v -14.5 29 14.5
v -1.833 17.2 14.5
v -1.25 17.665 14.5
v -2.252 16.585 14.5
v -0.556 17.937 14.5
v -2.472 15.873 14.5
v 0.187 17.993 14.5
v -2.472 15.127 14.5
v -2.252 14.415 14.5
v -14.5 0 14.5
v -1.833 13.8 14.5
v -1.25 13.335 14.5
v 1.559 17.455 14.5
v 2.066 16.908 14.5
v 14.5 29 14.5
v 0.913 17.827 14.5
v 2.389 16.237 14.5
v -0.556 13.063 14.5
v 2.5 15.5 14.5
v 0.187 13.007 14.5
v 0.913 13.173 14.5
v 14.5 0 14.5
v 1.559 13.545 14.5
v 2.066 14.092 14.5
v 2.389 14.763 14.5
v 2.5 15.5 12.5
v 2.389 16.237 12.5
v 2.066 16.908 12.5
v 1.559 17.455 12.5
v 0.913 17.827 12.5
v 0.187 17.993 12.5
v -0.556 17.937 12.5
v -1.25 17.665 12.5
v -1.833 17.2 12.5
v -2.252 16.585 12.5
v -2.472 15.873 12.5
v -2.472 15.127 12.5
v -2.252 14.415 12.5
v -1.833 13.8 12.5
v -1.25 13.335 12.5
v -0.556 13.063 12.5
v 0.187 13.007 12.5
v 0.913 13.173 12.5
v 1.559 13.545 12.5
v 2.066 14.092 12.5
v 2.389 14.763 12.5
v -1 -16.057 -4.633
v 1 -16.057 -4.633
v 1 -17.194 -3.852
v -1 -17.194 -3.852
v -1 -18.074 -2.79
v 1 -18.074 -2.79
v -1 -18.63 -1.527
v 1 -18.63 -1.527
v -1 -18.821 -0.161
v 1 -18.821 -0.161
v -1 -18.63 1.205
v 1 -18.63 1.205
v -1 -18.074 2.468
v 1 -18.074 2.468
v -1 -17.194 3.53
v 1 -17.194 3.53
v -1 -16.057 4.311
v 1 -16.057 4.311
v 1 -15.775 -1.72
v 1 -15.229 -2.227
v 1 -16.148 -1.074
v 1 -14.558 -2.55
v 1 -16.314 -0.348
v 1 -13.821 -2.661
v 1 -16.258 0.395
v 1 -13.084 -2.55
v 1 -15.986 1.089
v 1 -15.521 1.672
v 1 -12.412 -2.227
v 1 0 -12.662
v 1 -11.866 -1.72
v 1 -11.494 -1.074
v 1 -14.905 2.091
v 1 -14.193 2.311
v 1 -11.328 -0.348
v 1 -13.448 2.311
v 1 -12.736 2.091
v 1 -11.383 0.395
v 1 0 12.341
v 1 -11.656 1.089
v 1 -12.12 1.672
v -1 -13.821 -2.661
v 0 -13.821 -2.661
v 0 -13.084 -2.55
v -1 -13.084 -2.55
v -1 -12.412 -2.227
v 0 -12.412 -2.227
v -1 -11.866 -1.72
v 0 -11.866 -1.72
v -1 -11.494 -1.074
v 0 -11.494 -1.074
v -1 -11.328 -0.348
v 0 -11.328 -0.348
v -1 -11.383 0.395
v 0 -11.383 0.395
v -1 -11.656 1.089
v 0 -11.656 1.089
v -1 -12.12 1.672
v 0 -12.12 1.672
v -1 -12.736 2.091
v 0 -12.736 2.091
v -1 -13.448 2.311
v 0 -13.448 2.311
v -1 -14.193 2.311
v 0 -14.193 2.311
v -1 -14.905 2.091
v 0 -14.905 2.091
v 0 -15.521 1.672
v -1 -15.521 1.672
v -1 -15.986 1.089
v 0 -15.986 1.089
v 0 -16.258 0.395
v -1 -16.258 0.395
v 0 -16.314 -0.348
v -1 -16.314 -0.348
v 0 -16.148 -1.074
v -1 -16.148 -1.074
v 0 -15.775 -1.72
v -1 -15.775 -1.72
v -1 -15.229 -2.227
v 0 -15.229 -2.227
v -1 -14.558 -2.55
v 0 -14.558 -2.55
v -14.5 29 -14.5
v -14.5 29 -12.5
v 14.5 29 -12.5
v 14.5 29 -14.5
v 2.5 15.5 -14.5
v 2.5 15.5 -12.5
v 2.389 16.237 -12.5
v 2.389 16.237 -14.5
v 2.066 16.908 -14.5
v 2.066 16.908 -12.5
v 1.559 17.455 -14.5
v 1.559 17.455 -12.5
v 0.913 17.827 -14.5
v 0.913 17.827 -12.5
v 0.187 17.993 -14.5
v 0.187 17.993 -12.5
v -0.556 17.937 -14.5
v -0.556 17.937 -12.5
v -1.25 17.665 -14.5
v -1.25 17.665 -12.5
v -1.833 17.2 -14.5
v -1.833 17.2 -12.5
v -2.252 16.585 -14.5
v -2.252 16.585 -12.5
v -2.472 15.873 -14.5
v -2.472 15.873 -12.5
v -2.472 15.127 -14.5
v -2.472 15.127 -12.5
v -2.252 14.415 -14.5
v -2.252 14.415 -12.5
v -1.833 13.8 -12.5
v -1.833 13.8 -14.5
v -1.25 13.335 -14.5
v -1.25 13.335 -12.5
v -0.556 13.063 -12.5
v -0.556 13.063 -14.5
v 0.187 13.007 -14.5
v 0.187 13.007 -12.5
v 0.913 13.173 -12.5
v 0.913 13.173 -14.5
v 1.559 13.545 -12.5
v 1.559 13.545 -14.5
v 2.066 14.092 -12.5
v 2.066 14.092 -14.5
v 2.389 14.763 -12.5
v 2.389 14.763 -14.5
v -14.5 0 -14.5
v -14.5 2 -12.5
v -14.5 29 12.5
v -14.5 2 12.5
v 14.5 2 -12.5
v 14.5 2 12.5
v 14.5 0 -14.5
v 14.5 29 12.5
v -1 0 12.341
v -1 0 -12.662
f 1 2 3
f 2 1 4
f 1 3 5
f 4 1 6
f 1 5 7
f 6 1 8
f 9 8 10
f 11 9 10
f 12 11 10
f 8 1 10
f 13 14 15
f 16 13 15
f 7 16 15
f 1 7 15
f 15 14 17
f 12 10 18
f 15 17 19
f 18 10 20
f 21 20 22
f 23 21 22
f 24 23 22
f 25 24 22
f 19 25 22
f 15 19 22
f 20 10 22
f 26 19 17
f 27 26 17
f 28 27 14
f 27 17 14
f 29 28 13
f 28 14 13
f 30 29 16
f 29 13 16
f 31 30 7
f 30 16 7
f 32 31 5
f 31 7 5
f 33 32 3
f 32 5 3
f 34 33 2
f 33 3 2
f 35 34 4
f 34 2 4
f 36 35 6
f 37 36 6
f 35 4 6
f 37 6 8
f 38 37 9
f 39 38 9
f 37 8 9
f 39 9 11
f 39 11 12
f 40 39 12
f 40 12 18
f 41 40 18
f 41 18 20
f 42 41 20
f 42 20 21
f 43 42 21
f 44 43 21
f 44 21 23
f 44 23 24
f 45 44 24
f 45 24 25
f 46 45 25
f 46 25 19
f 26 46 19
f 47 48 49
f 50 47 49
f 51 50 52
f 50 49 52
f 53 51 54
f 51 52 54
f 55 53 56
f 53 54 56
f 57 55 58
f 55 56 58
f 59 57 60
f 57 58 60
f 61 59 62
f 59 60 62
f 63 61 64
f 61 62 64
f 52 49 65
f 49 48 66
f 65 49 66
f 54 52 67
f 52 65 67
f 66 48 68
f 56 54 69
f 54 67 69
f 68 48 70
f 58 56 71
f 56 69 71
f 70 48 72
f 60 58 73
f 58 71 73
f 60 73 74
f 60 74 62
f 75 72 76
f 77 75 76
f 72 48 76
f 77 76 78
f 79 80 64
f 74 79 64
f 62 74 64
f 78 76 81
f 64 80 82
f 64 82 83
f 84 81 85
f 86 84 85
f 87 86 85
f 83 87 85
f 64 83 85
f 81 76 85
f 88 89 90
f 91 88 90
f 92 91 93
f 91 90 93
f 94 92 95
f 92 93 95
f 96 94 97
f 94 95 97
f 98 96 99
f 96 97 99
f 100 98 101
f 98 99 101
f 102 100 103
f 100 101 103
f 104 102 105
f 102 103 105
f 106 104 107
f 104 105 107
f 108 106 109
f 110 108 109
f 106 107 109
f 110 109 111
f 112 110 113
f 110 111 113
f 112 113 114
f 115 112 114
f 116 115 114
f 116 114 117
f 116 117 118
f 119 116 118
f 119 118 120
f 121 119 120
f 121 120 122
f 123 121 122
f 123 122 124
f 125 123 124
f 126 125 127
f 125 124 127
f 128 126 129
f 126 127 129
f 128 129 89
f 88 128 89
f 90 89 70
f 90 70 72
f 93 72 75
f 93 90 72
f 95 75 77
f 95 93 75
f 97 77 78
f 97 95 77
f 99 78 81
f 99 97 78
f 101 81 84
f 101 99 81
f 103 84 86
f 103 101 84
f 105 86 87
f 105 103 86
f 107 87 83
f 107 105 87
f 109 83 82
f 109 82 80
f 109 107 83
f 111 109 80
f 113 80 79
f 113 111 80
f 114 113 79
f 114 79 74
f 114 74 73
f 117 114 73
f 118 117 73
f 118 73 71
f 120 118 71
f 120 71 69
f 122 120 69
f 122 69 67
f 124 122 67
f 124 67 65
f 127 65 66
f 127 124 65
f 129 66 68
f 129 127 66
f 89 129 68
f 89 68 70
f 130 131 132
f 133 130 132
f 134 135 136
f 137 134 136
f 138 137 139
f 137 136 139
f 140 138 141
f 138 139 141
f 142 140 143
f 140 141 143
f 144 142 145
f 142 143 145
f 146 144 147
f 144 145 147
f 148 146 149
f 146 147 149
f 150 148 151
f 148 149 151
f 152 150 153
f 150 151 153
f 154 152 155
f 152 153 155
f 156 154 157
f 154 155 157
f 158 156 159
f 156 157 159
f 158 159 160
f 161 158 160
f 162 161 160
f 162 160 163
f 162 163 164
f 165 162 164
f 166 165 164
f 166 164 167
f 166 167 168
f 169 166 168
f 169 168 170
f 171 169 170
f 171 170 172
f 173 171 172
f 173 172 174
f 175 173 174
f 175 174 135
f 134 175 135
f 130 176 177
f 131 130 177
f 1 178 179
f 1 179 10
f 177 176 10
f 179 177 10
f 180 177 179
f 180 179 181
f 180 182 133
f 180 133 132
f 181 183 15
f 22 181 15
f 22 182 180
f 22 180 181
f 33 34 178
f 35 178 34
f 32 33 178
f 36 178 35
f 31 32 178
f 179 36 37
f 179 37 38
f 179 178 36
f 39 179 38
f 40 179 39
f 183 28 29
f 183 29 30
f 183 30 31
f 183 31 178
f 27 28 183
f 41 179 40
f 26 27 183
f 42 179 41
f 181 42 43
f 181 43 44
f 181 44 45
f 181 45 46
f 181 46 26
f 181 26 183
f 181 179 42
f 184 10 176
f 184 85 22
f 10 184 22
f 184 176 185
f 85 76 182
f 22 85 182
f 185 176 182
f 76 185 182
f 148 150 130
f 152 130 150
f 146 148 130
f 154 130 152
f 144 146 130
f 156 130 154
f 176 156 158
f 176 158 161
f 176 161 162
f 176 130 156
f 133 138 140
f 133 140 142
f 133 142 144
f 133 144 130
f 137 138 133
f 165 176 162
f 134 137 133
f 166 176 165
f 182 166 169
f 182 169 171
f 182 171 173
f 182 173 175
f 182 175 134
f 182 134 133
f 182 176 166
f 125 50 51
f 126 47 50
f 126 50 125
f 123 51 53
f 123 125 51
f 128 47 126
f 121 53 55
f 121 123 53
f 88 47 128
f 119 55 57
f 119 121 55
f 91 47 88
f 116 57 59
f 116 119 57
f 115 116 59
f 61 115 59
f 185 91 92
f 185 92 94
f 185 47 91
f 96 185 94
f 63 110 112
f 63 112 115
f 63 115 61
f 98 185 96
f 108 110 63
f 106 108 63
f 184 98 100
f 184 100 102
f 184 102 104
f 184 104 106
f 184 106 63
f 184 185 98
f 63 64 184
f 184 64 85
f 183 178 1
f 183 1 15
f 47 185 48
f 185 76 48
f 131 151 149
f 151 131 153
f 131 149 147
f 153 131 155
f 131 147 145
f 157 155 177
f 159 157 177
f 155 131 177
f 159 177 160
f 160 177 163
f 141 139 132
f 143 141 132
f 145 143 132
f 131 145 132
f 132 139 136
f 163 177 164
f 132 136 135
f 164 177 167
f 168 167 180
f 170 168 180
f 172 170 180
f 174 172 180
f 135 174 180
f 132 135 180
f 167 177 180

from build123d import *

# Parameters (mm, degrees)
SKETCH1_W                = 29
SKETCH1_H                = 29
BOSS_EXTRUDE1_DEPTH      = 2
SKETCH2_W                = 29
SKETCH2_H                = 2
BOSS_EXTRUDE2_DEPTH      = 27
SKETCH4_R                = 2.5
CUT_EXTRUDE1_DEPTH       = 30
SKETCH6_R                = 2.5
BOSS_EXTRUDE3_DEPTH      = 1
BOSS_EXTRUDE3_DEPTH_BACK = 1


with BuildPart() as part:
    # Sketch1 → Boss-Extrude1 (new body)
    with BuildSketch(Plane(origin=(0, 0, 0), x_dir=(1, 0, 0), z_dir=(0, 1, 0))):
        Rectangle(SKETCH1_W, SKETCH1_H)
    extrude(amount=BOSS_EXTRUDE1_DEPTH)

    # Sketch2 → Boss-Extrude2 (add)
    with BuildSketch(Plane(origin=(0, 2, 0), x_dir=(1, 0, 0), z_dir=(0, 1, 0))):
        with Locations((0, -13.5)):
            Rectangle(SKETCH2_W, SKETCH2_H)
    boss_extrude2 = extrude(amount=BOSS_EXTRUDE2_DEPTH)

    # Mirror1: Boss-Extrude2 across plane
    add(boss_extrude2.mirror(Plane.XY))

    # Sketch4 → Cut-Extrude1 (cut, through all)
    with BuildSketch(Plane.XY.offset(14.5)):
        with Locations((0, 15.5)):
            Circle(SKETCH4_R)
    extrude(amount=-CUT_EXTRUDE1_DEPTH, mode=Mode.SUBTRACT)

    # Sketch6 → Boss-Extrude3 (add, two sides)
    with BuildSketch(Plane(origin=(0, 0, 0), x_dir=(0, 0, -1), z_dir=(1, 0, 0))) as boss_extrude3_sk:
        with BuildLine():
            Line((-12.340534921, 0), (12.662436349, 0))
            Line((12.662436349, 0), (4.632980363, -16.057003584))
            ThreePointArc((4.632980363, -16.057003584), (0.160950714, -18.820723008), (-4.311078935, -16.057003584))
            Line((-4.311078935, -16.057003584), (-12.340534921, 0))
        make_face()
        with Locations((0.160950714, -13.820723008)):
            Circle(SKETCH6_R, mode=Mode.SUBTRACT)
    extrude(amount=BOSS_EXTRUDE3_DEPTH)
    extrude(boss_extrude3_sk.sketch, amount=-BOSS_EXTRUDE3_DEPTH_BACK)


solid = part.part
